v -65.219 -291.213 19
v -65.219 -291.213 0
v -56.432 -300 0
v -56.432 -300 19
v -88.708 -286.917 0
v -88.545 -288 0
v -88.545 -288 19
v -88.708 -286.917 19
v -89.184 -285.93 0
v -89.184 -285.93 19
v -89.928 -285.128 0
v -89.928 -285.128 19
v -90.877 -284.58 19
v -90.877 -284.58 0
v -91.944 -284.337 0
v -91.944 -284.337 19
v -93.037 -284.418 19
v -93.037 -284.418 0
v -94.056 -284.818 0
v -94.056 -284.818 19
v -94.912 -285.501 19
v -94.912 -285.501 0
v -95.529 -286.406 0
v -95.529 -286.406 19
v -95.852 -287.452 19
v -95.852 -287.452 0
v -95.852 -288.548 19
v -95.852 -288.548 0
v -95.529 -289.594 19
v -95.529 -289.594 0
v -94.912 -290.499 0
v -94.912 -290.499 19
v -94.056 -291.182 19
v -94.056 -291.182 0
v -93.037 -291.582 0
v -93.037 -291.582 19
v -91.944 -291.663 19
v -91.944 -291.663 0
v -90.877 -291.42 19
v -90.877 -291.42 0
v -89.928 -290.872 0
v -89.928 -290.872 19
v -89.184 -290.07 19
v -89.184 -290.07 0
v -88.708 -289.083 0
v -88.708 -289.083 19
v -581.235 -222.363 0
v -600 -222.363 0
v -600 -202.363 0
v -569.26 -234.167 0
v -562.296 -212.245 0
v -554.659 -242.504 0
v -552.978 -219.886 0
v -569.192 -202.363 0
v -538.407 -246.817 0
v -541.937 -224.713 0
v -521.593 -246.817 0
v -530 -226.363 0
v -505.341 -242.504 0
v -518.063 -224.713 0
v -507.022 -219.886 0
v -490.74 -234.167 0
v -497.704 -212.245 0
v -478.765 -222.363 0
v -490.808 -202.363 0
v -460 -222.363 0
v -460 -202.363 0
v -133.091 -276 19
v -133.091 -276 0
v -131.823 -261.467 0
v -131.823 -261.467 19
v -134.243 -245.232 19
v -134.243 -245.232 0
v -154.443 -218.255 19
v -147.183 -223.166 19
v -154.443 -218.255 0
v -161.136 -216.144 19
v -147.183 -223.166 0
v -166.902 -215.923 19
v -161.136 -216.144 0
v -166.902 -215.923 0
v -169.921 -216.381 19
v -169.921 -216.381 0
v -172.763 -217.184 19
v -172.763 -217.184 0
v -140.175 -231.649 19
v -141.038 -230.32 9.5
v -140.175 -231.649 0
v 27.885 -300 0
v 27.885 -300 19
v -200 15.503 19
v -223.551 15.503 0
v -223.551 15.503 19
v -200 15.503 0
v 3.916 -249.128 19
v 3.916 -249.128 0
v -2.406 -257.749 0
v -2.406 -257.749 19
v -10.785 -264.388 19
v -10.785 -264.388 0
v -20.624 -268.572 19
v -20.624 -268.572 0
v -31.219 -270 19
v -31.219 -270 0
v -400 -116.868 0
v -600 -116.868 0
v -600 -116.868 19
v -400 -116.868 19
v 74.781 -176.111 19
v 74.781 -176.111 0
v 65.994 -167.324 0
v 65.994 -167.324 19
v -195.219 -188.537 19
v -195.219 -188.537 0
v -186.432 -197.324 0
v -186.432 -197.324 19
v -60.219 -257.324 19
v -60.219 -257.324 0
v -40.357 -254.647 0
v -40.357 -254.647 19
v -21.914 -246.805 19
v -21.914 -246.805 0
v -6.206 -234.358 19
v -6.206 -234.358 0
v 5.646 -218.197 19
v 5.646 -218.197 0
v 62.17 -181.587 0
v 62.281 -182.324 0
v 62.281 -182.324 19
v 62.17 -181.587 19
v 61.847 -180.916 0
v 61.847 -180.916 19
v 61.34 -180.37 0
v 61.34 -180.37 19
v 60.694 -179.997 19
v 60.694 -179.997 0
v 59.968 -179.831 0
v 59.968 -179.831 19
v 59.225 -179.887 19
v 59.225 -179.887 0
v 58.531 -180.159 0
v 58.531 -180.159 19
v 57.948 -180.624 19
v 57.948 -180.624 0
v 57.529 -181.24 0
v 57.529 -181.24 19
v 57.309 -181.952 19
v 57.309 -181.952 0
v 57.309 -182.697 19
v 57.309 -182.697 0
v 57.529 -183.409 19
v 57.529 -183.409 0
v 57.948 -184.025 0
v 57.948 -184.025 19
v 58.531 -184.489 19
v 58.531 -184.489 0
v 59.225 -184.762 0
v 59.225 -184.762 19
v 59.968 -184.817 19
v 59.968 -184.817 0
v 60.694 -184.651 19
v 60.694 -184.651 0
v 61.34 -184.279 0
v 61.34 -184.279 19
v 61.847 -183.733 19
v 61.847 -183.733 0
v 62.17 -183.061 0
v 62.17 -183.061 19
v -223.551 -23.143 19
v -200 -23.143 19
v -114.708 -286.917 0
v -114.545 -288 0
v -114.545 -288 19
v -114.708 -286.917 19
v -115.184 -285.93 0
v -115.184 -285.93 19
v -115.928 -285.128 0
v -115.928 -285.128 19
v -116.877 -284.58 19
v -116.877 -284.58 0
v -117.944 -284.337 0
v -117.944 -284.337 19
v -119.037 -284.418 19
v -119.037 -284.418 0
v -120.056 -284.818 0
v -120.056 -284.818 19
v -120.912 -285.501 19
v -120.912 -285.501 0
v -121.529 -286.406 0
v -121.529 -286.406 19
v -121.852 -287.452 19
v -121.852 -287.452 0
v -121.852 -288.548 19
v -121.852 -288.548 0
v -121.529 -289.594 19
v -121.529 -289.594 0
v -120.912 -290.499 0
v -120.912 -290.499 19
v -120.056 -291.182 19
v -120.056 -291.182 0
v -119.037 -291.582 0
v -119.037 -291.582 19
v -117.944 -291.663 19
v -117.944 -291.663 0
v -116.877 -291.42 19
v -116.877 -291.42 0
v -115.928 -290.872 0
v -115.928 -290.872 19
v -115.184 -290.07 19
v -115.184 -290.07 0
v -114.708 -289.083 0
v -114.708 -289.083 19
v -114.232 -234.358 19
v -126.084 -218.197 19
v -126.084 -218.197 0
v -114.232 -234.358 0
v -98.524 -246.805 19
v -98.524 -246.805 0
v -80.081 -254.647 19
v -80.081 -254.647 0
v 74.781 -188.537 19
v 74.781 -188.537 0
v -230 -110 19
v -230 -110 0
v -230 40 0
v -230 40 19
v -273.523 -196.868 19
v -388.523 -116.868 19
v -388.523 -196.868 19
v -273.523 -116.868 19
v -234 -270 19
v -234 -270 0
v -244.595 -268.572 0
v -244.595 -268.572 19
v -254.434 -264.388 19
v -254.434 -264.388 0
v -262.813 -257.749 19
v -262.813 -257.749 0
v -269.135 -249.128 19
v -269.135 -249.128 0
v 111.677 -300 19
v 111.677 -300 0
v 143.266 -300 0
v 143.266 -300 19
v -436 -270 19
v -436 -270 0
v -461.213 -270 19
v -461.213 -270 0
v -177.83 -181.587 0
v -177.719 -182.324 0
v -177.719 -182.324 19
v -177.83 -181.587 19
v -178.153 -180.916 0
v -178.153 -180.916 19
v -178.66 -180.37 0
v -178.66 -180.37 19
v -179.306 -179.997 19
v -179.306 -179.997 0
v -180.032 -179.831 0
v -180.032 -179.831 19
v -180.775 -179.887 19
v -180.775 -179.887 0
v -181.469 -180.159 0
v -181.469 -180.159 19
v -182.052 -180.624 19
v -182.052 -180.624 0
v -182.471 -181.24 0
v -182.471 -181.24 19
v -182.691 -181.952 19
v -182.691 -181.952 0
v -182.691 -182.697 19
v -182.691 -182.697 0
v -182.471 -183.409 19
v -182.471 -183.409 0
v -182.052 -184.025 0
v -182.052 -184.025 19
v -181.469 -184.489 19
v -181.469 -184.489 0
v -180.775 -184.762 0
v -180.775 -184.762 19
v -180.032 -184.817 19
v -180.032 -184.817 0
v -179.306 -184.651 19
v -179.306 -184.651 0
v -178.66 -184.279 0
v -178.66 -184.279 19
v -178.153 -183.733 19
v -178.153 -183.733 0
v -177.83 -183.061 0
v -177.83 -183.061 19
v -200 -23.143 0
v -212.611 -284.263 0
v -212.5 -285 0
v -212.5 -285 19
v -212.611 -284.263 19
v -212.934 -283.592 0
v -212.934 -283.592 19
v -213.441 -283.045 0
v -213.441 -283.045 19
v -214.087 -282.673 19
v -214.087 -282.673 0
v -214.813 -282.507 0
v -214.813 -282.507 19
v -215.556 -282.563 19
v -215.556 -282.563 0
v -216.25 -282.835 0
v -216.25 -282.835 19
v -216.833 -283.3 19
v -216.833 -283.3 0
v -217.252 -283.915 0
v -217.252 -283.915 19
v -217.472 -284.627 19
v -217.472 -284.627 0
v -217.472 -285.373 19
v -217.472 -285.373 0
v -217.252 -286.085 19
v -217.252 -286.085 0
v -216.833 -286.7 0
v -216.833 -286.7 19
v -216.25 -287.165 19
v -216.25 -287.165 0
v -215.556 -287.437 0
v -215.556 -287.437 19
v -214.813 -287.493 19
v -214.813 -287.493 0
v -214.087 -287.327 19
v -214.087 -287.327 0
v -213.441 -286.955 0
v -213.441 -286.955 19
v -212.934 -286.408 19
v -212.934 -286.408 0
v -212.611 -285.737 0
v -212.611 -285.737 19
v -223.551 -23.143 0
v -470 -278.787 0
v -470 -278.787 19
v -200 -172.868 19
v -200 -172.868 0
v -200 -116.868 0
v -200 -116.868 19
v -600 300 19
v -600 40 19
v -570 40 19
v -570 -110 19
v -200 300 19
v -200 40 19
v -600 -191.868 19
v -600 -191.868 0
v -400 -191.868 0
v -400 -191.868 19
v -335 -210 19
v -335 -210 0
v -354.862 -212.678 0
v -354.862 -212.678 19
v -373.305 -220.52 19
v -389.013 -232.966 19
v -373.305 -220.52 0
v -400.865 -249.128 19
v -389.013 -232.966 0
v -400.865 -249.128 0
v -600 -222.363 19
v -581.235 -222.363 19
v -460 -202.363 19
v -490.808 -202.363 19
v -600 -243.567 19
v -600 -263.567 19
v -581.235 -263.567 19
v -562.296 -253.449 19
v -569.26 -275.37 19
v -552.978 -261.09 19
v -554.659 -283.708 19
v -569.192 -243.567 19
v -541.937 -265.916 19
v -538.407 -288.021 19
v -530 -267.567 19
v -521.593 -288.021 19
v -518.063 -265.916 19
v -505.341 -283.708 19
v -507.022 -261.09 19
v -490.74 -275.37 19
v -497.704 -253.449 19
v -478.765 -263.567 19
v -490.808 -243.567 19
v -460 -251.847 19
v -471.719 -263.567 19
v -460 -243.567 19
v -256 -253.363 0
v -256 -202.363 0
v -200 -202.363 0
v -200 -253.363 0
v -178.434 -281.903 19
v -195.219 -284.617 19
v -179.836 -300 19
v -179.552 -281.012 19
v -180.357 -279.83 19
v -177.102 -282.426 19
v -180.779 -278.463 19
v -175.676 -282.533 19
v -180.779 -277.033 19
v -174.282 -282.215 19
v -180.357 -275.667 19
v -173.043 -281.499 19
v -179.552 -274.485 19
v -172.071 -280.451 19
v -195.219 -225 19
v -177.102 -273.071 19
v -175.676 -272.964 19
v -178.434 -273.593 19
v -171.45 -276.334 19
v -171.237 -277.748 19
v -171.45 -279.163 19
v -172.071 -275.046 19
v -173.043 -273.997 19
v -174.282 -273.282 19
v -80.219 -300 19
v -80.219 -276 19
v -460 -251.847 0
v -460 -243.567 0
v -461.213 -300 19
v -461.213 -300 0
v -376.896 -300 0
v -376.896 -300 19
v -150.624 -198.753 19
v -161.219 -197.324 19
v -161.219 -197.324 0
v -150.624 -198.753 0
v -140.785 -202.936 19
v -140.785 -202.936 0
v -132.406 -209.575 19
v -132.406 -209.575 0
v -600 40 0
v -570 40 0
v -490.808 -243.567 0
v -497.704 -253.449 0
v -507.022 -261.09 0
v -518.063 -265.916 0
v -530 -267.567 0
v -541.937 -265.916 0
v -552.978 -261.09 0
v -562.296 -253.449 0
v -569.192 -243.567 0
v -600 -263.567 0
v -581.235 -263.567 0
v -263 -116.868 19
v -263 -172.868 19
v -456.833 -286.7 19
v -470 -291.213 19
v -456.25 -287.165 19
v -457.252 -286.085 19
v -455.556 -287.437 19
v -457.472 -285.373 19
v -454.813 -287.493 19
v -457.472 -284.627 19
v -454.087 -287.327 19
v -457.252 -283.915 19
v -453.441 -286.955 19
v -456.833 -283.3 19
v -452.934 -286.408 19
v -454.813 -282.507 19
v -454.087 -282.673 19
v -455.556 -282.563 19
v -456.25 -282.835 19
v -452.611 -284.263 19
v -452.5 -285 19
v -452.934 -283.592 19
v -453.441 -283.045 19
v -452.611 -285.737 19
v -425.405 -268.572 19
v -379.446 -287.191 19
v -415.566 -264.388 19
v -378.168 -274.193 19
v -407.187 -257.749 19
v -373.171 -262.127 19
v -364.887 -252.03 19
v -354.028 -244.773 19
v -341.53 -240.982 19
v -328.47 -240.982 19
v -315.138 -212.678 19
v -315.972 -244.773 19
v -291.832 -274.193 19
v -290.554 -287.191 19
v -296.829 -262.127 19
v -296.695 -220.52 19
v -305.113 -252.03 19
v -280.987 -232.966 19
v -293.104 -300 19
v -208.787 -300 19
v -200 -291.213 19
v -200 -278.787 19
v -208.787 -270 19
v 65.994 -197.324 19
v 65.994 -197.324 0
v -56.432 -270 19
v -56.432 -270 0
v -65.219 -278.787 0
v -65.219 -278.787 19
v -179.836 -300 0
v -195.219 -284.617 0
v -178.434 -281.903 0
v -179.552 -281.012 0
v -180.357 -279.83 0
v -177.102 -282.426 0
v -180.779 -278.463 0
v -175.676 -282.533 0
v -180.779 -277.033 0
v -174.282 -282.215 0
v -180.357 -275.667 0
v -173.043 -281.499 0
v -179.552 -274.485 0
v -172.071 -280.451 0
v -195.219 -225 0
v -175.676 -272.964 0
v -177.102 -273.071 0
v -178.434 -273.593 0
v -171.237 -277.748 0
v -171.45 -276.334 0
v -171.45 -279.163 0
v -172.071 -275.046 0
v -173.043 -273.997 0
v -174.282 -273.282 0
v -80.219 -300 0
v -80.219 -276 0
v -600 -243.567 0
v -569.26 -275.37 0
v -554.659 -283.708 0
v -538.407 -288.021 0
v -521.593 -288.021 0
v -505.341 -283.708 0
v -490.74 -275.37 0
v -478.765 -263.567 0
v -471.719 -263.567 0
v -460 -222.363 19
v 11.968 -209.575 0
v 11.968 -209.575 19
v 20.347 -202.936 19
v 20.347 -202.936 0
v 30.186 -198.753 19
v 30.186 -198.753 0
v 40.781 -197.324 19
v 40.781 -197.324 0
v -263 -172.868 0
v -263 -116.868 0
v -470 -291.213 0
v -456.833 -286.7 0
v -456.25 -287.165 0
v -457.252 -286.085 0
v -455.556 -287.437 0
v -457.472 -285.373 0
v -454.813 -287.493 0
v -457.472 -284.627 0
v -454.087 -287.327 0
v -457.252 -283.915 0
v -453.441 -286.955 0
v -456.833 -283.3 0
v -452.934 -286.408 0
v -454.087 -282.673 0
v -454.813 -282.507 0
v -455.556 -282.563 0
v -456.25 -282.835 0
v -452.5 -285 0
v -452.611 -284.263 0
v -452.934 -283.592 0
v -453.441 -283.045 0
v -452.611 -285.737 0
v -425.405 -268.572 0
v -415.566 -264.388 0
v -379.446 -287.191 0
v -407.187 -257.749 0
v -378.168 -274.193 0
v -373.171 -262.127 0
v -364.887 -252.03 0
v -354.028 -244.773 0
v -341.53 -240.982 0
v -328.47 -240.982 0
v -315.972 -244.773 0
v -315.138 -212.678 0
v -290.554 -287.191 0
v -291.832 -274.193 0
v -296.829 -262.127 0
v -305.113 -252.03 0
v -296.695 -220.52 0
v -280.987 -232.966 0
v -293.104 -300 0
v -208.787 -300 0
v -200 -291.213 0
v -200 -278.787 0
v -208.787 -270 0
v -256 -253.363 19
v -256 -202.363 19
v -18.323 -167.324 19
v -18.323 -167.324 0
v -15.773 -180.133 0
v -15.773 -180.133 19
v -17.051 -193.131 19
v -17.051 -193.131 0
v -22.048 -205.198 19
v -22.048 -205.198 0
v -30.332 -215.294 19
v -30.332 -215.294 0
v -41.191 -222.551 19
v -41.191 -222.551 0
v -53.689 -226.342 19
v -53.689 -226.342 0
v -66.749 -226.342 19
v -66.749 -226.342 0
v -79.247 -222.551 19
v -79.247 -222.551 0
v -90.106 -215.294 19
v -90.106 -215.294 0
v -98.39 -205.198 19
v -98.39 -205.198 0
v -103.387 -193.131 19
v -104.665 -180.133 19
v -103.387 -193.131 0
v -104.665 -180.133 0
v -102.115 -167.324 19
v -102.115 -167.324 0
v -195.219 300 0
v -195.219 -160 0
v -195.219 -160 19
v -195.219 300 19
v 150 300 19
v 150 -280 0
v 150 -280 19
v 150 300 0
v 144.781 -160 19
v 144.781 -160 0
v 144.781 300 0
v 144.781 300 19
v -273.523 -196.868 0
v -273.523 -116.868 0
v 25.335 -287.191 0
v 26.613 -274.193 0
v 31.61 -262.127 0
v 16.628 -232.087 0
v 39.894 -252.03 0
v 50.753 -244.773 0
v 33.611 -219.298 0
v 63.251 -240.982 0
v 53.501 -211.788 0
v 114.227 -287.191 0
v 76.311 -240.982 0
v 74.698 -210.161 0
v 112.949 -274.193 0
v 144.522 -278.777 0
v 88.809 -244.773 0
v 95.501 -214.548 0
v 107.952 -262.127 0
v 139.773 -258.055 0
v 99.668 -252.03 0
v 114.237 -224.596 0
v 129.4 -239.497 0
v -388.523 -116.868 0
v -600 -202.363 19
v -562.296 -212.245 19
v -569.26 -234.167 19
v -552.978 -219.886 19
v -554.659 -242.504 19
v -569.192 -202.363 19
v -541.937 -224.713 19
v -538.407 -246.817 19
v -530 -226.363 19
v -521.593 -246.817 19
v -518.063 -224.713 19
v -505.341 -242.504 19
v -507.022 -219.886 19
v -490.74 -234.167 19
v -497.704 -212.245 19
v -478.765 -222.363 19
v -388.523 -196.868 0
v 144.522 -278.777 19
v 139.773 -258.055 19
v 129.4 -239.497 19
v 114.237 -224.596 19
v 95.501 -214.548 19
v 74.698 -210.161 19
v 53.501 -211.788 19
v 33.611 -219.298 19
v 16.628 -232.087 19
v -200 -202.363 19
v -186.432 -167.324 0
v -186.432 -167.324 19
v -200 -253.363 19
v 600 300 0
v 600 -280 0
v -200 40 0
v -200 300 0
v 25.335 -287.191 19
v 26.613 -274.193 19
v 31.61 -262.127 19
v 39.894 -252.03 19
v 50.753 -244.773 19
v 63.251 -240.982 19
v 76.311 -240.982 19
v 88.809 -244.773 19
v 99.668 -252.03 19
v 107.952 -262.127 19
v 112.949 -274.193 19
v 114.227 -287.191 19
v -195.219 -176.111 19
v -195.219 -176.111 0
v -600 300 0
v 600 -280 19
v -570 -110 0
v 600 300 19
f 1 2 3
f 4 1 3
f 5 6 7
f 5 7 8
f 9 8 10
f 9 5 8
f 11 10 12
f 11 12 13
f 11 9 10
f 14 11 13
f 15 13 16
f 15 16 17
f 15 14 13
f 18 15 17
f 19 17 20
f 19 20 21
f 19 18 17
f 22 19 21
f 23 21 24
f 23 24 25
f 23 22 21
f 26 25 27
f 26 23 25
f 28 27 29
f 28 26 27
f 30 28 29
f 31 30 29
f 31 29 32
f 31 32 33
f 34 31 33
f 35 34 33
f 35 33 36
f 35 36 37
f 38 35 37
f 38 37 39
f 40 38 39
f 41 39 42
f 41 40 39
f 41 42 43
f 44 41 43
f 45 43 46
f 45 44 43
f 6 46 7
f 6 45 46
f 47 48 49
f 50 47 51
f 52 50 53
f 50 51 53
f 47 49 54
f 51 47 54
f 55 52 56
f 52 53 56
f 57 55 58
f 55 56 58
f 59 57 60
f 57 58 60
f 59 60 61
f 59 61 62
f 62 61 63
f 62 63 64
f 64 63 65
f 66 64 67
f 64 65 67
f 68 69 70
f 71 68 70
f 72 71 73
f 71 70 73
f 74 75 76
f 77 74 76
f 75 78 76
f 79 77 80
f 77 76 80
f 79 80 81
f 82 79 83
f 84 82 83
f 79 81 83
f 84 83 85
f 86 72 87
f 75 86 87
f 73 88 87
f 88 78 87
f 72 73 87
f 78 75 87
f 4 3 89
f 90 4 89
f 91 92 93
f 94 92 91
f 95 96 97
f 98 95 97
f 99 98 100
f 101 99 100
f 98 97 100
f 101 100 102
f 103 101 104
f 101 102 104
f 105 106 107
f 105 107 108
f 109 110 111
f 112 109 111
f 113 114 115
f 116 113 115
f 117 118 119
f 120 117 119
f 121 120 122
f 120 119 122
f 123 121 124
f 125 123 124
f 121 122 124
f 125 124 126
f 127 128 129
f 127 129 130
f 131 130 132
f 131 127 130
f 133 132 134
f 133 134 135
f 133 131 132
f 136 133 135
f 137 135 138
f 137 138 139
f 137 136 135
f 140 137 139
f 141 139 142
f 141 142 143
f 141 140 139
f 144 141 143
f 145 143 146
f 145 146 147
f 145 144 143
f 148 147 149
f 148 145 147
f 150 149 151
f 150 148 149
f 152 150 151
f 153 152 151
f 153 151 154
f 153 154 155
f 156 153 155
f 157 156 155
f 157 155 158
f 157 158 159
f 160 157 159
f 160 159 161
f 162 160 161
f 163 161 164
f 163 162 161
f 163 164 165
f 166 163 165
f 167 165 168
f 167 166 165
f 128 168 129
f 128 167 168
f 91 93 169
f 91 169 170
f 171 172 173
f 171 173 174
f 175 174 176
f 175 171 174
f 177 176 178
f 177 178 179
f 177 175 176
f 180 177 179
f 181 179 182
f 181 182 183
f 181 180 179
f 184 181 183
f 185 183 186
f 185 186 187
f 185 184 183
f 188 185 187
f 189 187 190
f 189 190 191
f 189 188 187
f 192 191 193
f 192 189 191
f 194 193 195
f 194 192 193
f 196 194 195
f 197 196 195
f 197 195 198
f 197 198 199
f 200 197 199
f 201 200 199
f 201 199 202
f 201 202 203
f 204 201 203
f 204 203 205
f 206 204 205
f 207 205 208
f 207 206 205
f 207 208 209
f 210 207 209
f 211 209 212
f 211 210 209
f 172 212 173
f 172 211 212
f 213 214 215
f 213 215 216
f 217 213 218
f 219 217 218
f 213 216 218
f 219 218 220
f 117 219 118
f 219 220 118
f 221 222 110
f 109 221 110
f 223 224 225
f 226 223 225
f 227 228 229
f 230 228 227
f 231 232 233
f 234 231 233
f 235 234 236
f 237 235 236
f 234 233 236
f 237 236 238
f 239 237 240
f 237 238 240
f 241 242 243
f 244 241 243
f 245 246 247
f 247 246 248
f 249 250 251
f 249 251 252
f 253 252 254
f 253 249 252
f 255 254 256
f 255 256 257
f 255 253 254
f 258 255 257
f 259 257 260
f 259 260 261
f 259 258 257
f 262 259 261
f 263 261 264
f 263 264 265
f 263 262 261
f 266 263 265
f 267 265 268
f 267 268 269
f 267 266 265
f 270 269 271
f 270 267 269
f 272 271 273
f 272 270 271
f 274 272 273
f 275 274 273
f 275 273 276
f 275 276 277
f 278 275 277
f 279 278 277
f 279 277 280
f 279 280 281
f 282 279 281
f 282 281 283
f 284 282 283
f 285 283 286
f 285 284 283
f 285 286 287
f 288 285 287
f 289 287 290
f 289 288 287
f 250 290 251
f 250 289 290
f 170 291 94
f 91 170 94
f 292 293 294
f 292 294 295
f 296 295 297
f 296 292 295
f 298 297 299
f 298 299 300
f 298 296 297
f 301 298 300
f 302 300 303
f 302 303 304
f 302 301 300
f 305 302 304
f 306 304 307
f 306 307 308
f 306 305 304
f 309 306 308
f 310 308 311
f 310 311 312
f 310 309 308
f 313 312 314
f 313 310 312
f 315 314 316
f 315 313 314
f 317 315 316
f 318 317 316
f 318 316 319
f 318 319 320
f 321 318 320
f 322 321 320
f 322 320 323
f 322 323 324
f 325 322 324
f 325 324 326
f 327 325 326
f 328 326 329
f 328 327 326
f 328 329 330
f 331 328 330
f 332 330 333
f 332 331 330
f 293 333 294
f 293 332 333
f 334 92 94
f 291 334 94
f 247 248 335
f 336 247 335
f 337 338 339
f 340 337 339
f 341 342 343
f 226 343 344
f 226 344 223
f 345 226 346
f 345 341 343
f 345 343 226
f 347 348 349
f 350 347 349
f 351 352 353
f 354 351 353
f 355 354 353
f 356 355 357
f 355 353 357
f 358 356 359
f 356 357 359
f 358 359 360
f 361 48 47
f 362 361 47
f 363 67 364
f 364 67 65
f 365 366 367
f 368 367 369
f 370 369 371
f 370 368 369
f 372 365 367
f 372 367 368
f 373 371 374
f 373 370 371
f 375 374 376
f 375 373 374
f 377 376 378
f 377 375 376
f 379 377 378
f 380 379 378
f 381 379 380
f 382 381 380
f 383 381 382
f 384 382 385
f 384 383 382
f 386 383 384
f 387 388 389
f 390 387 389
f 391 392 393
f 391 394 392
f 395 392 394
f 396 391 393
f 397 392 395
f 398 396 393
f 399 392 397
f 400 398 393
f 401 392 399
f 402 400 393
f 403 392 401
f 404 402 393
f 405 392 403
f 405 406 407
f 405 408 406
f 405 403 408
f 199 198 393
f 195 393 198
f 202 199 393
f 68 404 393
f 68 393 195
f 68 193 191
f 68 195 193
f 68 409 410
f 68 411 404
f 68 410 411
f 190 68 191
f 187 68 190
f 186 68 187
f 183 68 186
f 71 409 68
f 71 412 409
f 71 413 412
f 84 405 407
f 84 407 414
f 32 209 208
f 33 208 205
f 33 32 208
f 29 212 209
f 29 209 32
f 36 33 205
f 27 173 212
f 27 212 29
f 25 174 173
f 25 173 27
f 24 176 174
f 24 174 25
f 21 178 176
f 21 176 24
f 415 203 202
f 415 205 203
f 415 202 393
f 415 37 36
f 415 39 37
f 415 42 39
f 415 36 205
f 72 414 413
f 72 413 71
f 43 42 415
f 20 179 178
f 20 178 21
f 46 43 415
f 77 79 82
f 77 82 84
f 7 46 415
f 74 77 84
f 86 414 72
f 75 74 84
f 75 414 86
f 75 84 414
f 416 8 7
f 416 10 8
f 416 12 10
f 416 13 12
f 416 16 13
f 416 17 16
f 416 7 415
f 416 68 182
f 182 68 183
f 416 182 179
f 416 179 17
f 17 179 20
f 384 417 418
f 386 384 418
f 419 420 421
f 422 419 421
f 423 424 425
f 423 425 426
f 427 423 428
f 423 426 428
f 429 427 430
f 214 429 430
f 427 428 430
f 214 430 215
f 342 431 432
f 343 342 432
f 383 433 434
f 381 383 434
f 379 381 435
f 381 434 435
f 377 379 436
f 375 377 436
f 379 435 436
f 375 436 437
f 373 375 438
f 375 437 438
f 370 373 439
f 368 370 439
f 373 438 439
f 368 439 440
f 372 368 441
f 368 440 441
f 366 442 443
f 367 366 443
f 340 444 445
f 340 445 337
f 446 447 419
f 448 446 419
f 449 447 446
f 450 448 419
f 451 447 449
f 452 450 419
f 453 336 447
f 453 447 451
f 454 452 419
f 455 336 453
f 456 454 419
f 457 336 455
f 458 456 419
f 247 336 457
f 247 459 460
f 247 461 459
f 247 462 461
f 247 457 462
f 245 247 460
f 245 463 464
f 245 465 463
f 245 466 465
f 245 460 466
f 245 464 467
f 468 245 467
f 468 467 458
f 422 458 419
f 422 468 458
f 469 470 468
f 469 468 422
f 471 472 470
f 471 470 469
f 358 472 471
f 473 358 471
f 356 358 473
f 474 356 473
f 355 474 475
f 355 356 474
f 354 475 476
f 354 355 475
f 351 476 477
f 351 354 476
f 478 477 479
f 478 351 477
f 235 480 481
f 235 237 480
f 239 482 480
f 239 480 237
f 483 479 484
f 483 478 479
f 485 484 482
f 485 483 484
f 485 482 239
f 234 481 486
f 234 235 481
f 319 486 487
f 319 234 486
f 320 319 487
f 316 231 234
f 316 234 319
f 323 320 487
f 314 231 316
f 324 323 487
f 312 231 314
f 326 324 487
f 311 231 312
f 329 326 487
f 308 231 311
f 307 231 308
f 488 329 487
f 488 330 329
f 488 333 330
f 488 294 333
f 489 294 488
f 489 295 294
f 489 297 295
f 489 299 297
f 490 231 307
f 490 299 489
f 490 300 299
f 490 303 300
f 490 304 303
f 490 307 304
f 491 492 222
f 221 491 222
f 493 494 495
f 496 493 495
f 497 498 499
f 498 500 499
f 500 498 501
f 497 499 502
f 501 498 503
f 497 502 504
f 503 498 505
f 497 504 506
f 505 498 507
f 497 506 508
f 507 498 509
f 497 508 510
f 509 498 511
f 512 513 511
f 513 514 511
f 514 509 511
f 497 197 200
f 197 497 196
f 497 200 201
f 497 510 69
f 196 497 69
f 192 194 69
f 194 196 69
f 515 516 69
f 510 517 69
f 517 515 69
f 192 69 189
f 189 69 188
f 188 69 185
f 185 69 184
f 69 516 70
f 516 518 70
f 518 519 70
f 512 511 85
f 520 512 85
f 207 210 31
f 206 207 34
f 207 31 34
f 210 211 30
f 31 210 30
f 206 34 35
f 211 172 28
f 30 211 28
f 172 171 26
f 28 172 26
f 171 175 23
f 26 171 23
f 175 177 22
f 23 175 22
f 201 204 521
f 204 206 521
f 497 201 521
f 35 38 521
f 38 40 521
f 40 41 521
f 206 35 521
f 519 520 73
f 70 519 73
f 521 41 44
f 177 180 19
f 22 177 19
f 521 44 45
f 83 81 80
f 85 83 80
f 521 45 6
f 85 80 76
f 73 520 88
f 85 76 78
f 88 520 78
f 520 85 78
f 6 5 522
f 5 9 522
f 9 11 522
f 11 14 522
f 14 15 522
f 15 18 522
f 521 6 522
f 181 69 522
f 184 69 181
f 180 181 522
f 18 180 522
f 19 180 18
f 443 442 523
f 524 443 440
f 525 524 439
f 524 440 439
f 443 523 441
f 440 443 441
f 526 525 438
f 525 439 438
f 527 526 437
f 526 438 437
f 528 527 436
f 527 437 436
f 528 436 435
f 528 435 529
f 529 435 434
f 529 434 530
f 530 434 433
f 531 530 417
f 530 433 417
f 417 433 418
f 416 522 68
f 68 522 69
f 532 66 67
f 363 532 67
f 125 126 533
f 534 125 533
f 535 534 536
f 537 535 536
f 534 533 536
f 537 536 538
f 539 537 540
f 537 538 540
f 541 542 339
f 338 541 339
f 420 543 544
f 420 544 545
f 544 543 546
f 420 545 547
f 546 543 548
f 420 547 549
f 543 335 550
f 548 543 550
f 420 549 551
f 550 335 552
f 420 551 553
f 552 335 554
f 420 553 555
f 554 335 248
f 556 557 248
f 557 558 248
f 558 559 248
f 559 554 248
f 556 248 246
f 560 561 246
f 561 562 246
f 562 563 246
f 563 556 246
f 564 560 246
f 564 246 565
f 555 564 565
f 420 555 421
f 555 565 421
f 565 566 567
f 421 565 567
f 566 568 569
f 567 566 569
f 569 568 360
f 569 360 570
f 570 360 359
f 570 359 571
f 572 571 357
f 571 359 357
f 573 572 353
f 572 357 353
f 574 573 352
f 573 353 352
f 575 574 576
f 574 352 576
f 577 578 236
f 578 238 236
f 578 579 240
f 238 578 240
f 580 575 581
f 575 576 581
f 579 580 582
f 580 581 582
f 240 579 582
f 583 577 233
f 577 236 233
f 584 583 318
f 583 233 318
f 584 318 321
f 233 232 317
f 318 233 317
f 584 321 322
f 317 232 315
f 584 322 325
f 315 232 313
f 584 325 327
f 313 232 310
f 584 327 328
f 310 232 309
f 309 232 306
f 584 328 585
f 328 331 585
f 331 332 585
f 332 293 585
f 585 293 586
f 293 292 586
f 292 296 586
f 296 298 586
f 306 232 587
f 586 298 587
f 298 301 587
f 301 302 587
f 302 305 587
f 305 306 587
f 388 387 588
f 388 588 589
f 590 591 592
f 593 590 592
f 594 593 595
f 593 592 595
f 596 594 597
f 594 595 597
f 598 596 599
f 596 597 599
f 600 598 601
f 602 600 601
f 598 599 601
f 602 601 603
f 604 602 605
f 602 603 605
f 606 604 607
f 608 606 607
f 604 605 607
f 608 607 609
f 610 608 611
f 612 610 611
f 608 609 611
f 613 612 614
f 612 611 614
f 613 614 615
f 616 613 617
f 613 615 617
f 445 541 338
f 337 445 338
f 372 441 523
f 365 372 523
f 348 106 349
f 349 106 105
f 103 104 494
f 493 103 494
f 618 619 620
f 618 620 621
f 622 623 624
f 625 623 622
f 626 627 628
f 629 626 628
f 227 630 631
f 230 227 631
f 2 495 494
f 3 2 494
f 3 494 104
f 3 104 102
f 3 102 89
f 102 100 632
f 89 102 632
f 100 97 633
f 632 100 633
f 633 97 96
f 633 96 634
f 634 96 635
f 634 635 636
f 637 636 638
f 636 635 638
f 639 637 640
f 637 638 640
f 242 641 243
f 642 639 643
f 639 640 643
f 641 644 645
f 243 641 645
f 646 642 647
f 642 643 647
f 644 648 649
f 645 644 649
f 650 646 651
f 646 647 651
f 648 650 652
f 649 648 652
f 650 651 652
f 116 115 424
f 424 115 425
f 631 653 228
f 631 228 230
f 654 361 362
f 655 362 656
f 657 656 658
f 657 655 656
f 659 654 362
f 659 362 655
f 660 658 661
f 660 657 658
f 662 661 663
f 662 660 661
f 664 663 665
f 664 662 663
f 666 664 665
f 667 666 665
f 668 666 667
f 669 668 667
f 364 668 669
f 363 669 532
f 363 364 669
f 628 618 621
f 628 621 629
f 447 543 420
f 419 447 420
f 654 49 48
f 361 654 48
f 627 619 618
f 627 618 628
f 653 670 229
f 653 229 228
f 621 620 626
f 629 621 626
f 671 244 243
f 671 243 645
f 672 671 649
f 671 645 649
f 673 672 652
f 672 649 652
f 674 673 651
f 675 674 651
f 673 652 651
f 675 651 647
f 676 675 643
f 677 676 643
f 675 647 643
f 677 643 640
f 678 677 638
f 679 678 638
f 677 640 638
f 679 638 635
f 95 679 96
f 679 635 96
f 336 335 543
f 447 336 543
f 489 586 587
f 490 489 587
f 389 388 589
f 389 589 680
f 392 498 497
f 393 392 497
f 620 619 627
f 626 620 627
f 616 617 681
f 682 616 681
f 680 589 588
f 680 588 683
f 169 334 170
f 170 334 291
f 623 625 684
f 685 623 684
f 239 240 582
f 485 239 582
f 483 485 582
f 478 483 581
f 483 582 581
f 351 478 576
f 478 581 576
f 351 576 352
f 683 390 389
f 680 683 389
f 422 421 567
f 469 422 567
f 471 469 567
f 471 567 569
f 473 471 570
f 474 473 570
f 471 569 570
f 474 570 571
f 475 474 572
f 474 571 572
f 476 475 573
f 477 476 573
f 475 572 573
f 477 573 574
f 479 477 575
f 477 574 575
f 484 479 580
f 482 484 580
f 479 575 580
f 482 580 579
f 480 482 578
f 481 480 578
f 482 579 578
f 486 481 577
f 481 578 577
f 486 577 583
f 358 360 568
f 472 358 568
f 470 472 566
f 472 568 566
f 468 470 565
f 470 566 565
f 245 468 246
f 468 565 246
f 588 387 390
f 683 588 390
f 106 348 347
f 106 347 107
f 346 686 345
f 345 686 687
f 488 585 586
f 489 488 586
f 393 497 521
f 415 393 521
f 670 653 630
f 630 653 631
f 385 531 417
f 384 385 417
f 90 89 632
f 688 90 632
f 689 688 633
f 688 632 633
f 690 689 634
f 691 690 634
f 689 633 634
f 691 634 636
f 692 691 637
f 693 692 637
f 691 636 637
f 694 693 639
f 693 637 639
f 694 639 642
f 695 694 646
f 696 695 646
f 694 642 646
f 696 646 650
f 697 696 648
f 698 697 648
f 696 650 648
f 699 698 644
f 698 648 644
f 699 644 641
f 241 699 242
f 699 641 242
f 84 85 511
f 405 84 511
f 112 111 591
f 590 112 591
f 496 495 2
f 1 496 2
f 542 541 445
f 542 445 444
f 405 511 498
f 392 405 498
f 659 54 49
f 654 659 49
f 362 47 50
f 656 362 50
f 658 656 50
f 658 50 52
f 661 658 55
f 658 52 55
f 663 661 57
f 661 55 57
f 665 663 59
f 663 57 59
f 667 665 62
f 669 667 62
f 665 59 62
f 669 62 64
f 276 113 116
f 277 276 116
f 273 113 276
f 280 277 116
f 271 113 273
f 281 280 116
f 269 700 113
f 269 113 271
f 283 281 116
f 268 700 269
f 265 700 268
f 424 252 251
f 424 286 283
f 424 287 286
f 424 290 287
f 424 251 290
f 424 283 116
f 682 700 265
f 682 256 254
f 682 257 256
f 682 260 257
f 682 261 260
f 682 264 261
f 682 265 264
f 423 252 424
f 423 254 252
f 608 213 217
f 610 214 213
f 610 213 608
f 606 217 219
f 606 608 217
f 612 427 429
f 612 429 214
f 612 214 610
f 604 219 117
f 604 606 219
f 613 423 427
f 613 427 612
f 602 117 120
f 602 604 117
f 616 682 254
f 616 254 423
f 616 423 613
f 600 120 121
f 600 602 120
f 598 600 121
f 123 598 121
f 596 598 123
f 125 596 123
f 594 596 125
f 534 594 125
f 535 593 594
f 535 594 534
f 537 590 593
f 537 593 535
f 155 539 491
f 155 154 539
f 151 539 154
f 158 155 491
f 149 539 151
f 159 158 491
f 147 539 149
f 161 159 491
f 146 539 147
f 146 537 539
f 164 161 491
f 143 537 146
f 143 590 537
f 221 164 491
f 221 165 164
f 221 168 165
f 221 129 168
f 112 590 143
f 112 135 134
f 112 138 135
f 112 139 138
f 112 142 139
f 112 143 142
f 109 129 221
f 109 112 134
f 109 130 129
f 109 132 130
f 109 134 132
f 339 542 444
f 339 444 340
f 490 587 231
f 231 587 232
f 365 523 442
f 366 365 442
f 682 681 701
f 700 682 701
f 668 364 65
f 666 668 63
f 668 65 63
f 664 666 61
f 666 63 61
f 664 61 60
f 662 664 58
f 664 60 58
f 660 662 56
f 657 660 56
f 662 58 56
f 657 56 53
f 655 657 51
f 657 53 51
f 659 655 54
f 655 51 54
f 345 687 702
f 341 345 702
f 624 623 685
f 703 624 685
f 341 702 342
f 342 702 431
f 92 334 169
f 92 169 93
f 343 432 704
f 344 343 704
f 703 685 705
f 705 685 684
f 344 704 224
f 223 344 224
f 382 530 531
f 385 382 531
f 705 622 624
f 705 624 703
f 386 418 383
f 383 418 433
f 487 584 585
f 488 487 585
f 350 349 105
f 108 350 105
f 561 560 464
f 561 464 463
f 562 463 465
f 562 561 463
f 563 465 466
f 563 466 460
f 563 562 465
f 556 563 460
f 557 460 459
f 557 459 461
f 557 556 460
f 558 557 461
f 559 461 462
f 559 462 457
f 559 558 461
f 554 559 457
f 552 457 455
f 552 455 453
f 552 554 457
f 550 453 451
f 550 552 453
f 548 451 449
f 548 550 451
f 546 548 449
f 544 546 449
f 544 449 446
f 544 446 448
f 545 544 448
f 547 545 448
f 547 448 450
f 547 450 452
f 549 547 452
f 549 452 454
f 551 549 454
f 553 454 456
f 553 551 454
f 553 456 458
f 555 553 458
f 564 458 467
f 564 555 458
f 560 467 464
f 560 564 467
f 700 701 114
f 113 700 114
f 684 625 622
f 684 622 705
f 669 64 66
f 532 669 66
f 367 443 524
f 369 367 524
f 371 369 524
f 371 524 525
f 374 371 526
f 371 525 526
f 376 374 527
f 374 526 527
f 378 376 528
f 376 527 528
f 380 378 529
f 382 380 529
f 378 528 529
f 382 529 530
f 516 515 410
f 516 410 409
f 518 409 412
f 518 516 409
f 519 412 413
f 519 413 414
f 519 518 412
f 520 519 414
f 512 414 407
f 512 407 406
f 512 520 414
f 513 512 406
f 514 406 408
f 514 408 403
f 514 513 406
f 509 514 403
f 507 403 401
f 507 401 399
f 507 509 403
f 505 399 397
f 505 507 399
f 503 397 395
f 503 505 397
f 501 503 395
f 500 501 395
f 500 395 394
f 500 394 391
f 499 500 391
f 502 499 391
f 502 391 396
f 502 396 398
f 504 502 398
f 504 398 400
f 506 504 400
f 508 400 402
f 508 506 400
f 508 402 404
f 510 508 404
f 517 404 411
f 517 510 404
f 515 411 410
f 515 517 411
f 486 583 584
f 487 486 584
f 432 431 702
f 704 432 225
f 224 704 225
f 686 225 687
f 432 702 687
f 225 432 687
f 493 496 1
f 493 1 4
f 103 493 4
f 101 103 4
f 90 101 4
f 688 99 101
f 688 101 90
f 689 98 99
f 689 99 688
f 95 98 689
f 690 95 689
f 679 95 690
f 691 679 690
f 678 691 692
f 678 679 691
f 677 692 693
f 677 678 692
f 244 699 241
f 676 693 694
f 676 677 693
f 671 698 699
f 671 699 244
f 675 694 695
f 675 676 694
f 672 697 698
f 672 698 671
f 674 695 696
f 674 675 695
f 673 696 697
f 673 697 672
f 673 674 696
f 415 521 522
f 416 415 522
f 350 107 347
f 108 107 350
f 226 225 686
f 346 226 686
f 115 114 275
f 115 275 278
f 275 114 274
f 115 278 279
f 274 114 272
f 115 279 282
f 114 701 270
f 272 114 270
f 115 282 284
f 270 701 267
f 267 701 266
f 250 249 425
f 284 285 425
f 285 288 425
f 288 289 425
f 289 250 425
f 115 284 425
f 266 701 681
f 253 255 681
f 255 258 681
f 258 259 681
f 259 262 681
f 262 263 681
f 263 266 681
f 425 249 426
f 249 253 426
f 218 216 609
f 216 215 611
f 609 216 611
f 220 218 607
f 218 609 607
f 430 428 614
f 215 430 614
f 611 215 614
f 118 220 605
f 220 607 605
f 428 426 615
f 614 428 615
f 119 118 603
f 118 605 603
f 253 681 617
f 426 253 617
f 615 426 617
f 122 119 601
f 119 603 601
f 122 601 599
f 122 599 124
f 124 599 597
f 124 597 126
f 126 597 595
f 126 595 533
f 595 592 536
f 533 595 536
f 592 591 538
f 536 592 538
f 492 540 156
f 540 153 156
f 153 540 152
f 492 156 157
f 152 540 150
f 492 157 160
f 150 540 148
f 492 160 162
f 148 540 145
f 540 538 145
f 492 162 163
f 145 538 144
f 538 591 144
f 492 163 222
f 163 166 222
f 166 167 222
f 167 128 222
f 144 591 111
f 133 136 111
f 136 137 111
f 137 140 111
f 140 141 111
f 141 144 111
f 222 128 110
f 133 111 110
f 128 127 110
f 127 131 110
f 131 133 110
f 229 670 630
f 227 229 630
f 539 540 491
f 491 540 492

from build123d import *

# Parameters (mm, degrees)
F2_DEPTH = 19
F0_W     = 340
F0_H     = 460
F0_W_2   = 450
F0_H_2   = 580
F1_W     = 200
F1_H     = 75
F1_W_2   = 115
F1_H_2   = 80
F1_W_3   = 63
F1_H_3   = 56
F1_W_4   = 23.5513094543
F1_H_4   = 38.6460761462
F1_R     = 2.5
F1_W_5   = 56
F1_H_5   = 51
F1_R_2   = 4.7978778686
F1_R_3   = 3.6737575136


with BuildPart() as f2:
    # F0 (on Top) → F2 (new body)
    with BuildSketch(Plane.XY):
        Polygon((-600, 300), (-600, 40), (-570, 40), (-570, -110), (-230, -110), (-230, 40), (-200, 40), (-200, 300), align=None)
    extrude(amount=F2_DEPTH)


with BuildPart() as f2b:
    # F0 (on Top) → F2, piece 2 (new body)
    with BuildSketch(Plane.XY):
        with Locations((-25.219039917, 70)):
            Rectangle(F0_W, F0_H)
    extrude(amount=F2_DEPTH)


with BuildPart() as f2c:
    # F0 (on Top) → F2, piece 3 (new body)
    with BuildSketch(Plane.XY):
        with Locations((375, 10)):
            Rectangle(F0_W_2, F0_H_2)
    extrude(amount=F2_DEPTH)


with BuildPart() as f2d:
    # F1 (on Top) → F2, piece 4 (new body)
    with BuildSketch(Plane.XY):
        with Locations((-500, -154.3677505483)):
            Rectangle(F1_W, F1_H)
    extrude(amount=F2_DEPTH)


with BuildPart() as f2e:
    # F1 (on Top) → F2, piece 5 (new body)
    with BuildSketch(Plane.XY):
        with Locations((-331.0229089997, -156.8677505483)):
            Rectangle(F1_W_2, F1_H_2)
    extrude(amount=F2_DEPTH)


with BuildPart() as f2f:
    # F1 (on Top) → F2, piece 6 (new body)
    with BuildSketch(Plane.XY):
        with Locations((-231.5, -144.8677505483)):
            Rectangle(F1_W_3, F1_H_3)
    extrude(amount=F2_DEPTH)


with BuildPart() as f2g:
    # F1 (on Top) → F2, piece 7 (new body)
    with BuildSketch(Plane.XY):
        with Locations((-211.7756547271, -3.8202817862)):
            Rectangle(F1_W_4, F1_H_4)
    extrude(amount=F2_DEPTH)


with BuildPart() as f2h:
    # F1 (on Top) → F2, piece 8 (new body)
    with BuildSketch(Plane.XY):
        with BuildLine():
            Line((-461.2132034356, -270), (-470, -278.7867965644))
            Line((-470, -278.7867965644), (-470, -291.2132034356))
            Line((-470, -291.2132034356), (-461.2132034356, -300))
            Line((-461.2132034356, -300), (-376.895703837, -300))
            ThreePointArc((-376.895703837, -300), (-335, -240.5), (-293.104296163, -300))
            Line((-293.104296163, -300), (-208.7867965644, -300))
            Line((-208.7867965644, -300), (-200, -291.2132034356))
            Line((-200, -291.2132034356), (-200, -278.7867965644))
            Line((-200, -278.7867965644), (-208.7867965644, -270))
            Line((-208.7867965644, -270), (-234, -270))
            ThreePointArc((-234, -270), (-254.4336726838, -264.3883490178), (-269.1352075937, -249.1275994493))
            ThreePointArc((-269.1352075937, -249.1275994493), (-296.6948439587, -220.5196539971), (-335, -210))
            ThreePointArc((-335, -210), (-373.3051560413, -220.5196539971), (-400.8647924063, -249.1275994493))
            ThreePointArc((-400.8647924063, -249.1275994493), (-415.5663273162, -264.3883490178), (-436, -270))
            Line((-436, -270), (-461.2132034356, -270))
        make_face()
        with Locations((-455, -285)):
            Circle(F1_R, mode=Mode.SUBTRACT)
        with Locations((-215, -285)):
            Circle(F1_R, mode=Mode.SUBTRACT)
    extrude(amount=F2_DEPTH)


with BuildPart() as f2i:
    # F1 (on Top) → F2, piece 9 (new body)
    with BuildSketch(Plane.XY):
        with Locations((-228, -227.8629653454)):
            Rectangle(F1_W_5, F1_H_5)
    extrude(amount=F2_DEPTH)


with BuildPart() as f2j:
    # F1 (on Top) → F2, piece 10 (new body)
    with BuildSketch(Plane.XY):
        with BuildLine():
            ThreePointArc((-490.8081641155, -202.3629653454), (-530, -226.3629653454), (-569.1918358845, -202.3629653454))
            Line((-569.1918358845, -202.3629653454), (-600, -202.3629653454))
            Line((-600, -202.3629653454), (-600, -222.3629653454))
            Line((-600, -222.3629653454), (-581.2347538298, -222.3629653454))
            ThreePointArc((-581.2347538298, -222.3629653454), (-530, -247.3629653454), (-478.7652461702, -222.3629653454))
            Line((-478.7652461702, -222.3629653454), (-460, -222.3629653454))
            Line((-460, -222.3629653454), (-460, -202.3629653454))
            Line((-460, -202.3629653454), (-490.8081641155, -202.3629653454))
        make_face()
    extrude(amount=F2_DEPTH)


with BuildPart() as f2k:
    # F1 (on Top) → F2, piece 11 (new body)
    with BuildSketch(Plane.XY):
        with BuildLine():
            ThreePointArc((-490.8081641155, -243.5665595531), (-530, -267.5665595531), (-569.1918358845, -243.5665595531))
            Line((-569.1918358845, -243.5665595531), (-600, -243.5665595531))
            Line((-600, -243.5665595531), (-600, -263.5665595531))
            Line((-600, -263.5665595531), (-581.2347538298, -263.5665595531))
            ThreePointArc((-581.2347538298, -263.5665595531), (-530, -288.5665595531), (-478.7652461702, -263.5665595531))
            Line((-478.7652461702, -263.5665595531), (-471.7193818092, -263.5665595531))
            Line((-471.7193818092, -263.5665595531), (-460, -251.8471777439))
            Line((-460, -251.8471777439), (-460, -243.5665595531))
            Line((-460, -243.5665595531), (-490.8081641155, -243.5665595531))
        make_face()
    extrude(amount=F2_DEPTH)


with BuildPart() as f2l:
    # F1 (on Top) → F2, piece 12 (new body)
    with BuildSketch(Plane.XY):
        with BuildLine():
            Line((65.9941635186, -197.3242174783), (74.780960083, -188.5374209139))
            Line((74.780960083, -188.5374209139), (74.780960083, -176.1110140427))
            Line((74.780960083, -176.1110140427), (65.9941635186, -167.3242174783))
            Line((65.9941635186, -167.3242174783), (-18.32333608, -167.3242174783))
            ThreePointArc((-18.32333608, -167.3242174783), (-60.219039917, -226.8242174783), (-102.114743754, -167.3242174783))
            Line((-102.114743754, -167.3242174783), (-186.4322433526, -167.3242174783))
            Line((-186.4322433526, -167.3242174783), (-195.219039917, -176.1110140427))
            Line((-195.219039917, -176.1110140427), (-195.219039917, -188.5374209139))
            Line((-195.219039917, -188.5374209139), (-186.4322433526, -197.3242174783))
            Line((-186.4322433526, -197.3242174783), (-161.219039917, -197.3242174783))
            ThreePointArc((-161.219039917, -197.3242174783), (-140.7853672332, -202.9358684605), (-126.0838323233, -218.196618029))
            ThreePointArc((-126.0838323233, -218.196618029), (-98.5241959583, -246.8045634812), (-60.219039917, -257.3242174783))
            ThreePointArc((-60.219039917, -257.3242174783), (-21.9138838757, -246.8045634812), (5.6457524894, -218.196618029))
            ThreePointArc((5.6457524894, -218.196618029), (20.3472873992, -202.9358684605), (40.780960083, -197.3242174783))
            Line((40.780960083, -197.3242174783), (65.9941635186, -197.3242174783))
        make_face()
        with Locations((-180.219039917, -182.3242174783)):
            Circle(F1_R, mode=Mode.SUBTRACT)
        with Locations((59.780960083, -182.3242174783)):
            Circle(F1_R, mode=Mode.SUBTRACT)
    extrude(amount=F2_DEPTH)


with BuildPart() as f2m:
    # F1 (on Top) → F2, piece 13 (new body)
    with BuildSketch(Plane.XY):
        with BuildLine():
            ThreePointArc((3.9161676767, -249.1275994493), (-10.7853672332, -264.3883490178), (-31.219039917, -270))
            Line((-31.219039917, -270), (-56.4322433526, -270))
            Line((-56.4322433526, -270), (-65.219039917, -278.7867965644))
            Line((-65.219039917, -278.7867965644), (-65.219039917, -291.2132034356))
            Line((-65.219039917, -291.2132034356), (-56.4322433526, -300))
            Line((-56.4322433526, -300), (27.885256246, -300))
            ThreePointArc((27.885256246, -300), (69.780960083, -240.5), (111.67666392, -300))
            Line((111.67666392, -300), (143.2656523665, -300))
            ThreePointArc((143.2656523665, -300), (95.5009134846, -214.5480021787), (3.9161676767, -249.1275994493))
        make_face()
    extrude(amount=F2_DEPTH)


with BuildPart() as f2n:
    # F1 (on Top) → F2, piece 14 (new body)
    with BuildSketch(Plane.XY):
        with BuildLine():
            Line((-195.219039917, -284.6167683601), (-179.8358082771, -300))
            Line((-179.8358082771, -300), (-80.219039917, -300))
            Line((-80.219039917, -300), (-80.219039917, -276))
            Line((-80.219039917, -276), (-133.0908532607, -276))
            add(Edge.make_bspline(
                [(-133.0908532607, -276), (-117.3498821546, -197.8978728169), (-172.7633978507, -217.1843810214)],
                knots=[4.432814907, 4.432814907, 4.432814907, 6.5228240339, 6.5228240339, 6.5228240339], degree=2, weights=[1, 0.5018979792, 1]))
            Line((-172.7633978507, -217.1843810214), (-195.219039917, -225))
            Line((-195.219039917, -225), (-195.219039917, -284.6167683601))
        make_face()
        with Locations((-176.0347038507, -277.7483165264)):
            Circle(F1_R_2, mode=Mode.SUBTRACT)
        with Locations((-118.219039917, -288)):
            Circle(F1_R_3, mode=Mode.SUBTRACT)
        with Locations((-92.219039917, -288)):
            Circle(F1_R_3, mode=Mode.SUBTRACT)
    extrude(amount=F2_DEPTH)


solid = Compound([f2.part, f2b.part, f2c.part, f2d.part, f2e.part, f2f.part, f2g.part, f2h.part, f2i.part, f2j.part, f2k.part, f2l.part, f2m.part, f2n.part])
